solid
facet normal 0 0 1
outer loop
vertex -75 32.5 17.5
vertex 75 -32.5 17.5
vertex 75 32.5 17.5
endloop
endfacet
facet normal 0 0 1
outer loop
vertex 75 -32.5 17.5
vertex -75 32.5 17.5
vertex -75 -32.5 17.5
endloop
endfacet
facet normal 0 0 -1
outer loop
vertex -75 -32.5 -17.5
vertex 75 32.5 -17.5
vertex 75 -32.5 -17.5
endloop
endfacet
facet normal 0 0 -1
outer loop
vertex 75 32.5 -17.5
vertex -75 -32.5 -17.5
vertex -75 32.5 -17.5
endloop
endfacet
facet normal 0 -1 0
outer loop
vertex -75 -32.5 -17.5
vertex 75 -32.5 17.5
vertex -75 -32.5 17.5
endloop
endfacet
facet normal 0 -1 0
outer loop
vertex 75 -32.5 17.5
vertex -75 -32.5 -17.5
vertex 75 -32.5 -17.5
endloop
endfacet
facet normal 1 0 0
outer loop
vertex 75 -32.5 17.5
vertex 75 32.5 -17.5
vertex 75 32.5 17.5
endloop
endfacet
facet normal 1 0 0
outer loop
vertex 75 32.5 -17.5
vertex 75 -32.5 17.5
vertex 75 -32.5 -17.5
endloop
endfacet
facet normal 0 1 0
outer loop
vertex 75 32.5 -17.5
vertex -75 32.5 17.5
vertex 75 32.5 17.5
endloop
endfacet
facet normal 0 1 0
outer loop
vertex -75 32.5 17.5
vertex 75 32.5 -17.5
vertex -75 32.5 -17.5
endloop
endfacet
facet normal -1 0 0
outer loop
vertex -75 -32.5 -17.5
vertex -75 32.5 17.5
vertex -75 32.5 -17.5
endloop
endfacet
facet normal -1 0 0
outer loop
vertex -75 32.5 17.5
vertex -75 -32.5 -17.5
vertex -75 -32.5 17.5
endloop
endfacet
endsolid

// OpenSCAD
// ========================================
// a 150 x 65 x 35 mm box
// NeuroCAD canonical IR; dimensions are millimetres
// ========================================
$fn = 48;

cube(size=[150, 65, 35], center=true);
